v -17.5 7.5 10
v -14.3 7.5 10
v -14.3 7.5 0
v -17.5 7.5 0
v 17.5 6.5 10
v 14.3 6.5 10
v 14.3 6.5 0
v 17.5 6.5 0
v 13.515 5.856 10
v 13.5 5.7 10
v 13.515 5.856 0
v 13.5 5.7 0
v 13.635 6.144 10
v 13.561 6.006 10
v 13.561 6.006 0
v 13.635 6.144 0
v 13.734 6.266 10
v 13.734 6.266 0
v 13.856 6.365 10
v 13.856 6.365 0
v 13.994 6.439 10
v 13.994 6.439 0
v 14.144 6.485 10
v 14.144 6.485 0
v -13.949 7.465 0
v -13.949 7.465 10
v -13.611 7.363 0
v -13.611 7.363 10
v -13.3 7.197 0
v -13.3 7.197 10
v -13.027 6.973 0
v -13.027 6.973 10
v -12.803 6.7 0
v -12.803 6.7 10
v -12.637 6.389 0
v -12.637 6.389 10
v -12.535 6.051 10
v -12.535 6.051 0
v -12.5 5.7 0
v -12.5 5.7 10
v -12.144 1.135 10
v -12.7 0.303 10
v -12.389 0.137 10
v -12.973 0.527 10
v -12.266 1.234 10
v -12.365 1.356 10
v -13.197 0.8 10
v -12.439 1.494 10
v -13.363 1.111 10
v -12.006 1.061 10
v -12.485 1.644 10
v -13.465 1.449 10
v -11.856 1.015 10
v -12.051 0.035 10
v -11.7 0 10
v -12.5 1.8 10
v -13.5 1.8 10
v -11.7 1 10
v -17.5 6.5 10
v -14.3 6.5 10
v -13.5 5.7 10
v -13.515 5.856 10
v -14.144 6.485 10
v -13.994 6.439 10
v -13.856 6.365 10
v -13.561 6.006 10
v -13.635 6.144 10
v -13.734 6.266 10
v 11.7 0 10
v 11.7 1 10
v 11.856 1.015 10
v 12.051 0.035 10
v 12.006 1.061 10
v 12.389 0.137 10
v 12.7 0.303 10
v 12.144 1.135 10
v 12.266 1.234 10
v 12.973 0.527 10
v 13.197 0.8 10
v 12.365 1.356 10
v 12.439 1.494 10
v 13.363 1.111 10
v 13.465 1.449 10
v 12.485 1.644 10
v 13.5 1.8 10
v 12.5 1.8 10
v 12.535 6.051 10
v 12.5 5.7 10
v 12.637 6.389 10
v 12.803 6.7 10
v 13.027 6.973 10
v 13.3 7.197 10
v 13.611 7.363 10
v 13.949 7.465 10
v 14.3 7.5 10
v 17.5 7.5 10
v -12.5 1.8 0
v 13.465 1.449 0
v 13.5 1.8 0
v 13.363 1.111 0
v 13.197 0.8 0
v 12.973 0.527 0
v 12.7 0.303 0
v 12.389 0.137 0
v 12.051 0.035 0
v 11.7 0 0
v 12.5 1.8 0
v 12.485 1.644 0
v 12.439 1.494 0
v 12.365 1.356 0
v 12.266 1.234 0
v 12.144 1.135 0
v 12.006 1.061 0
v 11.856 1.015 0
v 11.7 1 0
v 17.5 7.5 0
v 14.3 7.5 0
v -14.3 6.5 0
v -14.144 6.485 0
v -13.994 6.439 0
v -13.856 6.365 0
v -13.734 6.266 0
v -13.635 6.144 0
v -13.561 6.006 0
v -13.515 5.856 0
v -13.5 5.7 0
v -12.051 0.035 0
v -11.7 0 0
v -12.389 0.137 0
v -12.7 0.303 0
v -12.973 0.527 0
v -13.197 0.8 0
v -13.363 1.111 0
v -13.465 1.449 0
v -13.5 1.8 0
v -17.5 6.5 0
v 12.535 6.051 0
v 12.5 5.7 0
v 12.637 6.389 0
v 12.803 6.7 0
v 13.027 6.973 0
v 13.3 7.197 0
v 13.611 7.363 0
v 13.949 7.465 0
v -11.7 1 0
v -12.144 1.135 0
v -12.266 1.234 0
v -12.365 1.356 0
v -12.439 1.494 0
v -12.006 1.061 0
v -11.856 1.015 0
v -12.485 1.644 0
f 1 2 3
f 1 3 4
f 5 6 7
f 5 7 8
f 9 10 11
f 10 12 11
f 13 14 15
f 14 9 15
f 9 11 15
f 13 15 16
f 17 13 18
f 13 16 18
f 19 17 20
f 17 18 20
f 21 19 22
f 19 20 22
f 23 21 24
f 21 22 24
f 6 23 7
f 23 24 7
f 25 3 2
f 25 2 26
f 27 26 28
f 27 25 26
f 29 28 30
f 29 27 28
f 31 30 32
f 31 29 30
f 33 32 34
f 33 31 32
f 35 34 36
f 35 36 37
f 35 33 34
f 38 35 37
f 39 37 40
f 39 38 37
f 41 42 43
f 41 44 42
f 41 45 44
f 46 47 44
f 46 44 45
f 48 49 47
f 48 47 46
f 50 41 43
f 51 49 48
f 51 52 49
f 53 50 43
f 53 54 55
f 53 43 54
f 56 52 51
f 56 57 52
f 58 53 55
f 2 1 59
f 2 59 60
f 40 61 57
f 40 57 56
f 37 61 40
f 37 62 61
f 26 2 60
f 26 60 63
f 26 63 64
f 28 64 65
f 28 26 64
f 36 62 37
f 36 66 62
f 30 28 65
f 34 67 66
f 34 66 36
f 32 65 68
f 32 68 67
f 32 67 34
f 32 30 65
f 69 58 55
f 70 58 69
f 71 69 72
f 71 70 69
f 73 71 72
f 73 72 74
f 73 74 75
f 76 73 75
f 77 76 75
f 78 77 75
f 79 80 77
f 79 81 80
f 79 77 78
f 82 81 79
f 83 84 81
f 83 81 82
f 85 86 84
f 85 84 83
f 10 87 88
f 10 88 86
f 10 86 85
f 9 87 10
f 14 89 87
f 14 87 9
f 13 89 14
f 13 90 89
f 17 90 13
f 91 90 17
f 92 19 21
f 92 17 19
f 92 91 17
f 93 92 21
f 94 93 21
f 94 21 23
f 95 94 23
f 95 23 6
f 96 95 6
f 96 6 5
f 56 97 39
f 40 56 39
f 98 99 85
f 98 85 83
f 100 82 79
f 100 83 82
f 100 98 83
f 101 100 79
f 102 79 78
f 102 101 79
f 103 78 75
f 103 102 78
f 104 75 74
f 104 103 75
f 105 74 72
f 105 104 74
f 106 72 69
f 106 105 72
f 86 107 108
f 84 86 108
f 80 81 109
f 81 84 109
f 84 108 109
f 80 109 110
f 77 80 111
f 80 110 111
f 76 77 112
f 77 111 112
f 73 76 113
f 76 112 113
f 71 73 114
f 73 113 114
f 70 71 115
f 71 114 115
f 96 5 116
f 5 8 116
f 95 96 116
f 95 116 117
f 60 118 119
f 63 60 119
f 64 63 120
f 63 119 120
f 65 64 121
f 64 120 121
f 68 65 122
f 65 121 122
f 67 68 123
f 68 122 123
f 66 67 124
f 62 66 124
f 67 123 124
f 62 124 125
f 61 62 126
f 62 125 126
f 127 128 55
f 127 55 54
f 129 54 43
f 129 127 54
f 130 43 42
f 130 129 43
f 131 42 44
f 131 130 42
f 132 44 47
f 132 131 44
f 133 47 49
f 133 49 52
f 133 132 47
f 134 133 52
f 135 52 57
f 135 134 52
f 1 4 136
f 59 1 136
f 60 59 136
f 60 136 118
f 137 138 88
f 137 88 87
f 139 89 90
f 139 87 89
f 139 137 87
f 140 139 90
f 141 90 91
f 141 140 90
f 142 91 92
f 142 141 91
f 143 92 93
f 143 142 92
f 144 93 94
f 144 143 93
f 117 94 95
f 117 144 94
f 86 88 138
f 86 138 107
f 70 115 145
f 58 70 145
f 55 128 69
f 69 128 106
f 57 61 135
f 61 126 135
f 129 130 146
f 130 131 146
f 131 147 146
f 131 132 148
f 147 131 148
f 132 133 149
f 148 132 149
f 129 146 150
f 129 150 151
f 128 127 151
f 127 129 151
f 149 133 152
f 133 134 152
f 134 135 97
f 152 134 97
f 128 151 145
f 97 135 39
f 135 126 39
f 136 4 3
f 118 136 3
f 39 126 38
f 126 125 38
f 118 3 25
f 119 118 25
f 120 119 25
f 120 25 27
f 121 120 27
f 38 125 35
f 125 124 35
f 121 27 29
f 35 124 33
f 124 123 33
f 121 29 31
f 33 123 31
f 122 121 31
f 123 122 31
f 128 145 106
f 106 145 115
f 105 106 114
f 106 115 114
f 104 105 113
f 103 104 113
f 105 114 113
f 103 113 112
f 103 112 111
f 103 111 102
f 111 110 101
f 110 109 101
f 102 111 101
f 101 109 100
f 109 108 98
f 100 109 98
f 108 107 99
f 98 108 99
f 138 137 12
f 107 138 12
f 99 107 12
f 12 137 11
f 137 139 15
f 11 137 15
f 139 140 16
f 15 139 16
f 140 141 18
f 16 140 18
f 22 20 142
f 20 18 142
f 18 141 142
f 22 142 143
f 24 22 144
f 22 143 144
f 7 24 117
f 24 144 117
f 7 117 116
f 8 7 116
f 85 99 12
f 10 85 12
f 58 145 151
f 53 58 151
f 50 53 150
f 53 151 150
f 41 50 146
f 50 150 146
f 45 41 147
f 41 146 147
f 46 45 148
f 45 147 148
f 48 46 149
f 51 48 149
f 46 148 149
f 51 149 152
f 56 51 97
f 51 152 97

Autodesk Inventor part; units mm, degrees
ref_plane "YZ Plane" through (0, 0, 0) normal (1, 0, 0) x (0, 1, 0)
ref_plane "XZ Plane" through (0, 0, 0) normal (0, 1, 0) x (-1, 0, 0)
ref_plane "XY Plane" through (0, 0, 0) normal (0, 0, 1) x (1, 0, 0)
sketch "Sketch1" plane through (0, 0, 0) normal (0, 0, 1) x (1, 0, 0)
  line L0 (0, 0) -> (11.7, 0)
  arc A0 (11.7, 0) -> (13.5, 1.8) centre (11.7, 1.8) ccw
  line L1 (13.5, 1.8) -> (13.5, 5.7)
  arc A1 (14.3, 6.5) -> (13.5, 5.7) centre (14.3, 5.7) ccw
  line L2 (14.3, 6.5) -> (17.5, 6.5)
  line L3 (17.5, 6.5) -> (17.5, 7.5)
  line L4 (17.5, 7.5) -> (14.3, 7.5)
  arc A2 (14.3, 7.5) -> (12.5, 5.7) centre (14.3, 5.7) ccw
  line L5 (12.5, 5.7) -> (12.5, 1.8)
  arc A3 (11.7, 1) -> (12.5, 1.8) centre (11.7, 1.8) ccw
  line L6 (11.7, 1) -> (0, 1)
  line L7 (0, 1) -> (0, 0)
  dimension "d0" = 1
  dimension "d2" = 0.8
  dimension "d3" = 25
  dimension "d4" = 35
  dimension "d5" = 7.5
extrude "Extrusion1" add sketch "Sketch1" along normal blind 10
mirror "Mirror1" about plane through (0, 1, 0) normal (-1, 0, 0) of "Extrusion1"
properties part number "din_rail"
